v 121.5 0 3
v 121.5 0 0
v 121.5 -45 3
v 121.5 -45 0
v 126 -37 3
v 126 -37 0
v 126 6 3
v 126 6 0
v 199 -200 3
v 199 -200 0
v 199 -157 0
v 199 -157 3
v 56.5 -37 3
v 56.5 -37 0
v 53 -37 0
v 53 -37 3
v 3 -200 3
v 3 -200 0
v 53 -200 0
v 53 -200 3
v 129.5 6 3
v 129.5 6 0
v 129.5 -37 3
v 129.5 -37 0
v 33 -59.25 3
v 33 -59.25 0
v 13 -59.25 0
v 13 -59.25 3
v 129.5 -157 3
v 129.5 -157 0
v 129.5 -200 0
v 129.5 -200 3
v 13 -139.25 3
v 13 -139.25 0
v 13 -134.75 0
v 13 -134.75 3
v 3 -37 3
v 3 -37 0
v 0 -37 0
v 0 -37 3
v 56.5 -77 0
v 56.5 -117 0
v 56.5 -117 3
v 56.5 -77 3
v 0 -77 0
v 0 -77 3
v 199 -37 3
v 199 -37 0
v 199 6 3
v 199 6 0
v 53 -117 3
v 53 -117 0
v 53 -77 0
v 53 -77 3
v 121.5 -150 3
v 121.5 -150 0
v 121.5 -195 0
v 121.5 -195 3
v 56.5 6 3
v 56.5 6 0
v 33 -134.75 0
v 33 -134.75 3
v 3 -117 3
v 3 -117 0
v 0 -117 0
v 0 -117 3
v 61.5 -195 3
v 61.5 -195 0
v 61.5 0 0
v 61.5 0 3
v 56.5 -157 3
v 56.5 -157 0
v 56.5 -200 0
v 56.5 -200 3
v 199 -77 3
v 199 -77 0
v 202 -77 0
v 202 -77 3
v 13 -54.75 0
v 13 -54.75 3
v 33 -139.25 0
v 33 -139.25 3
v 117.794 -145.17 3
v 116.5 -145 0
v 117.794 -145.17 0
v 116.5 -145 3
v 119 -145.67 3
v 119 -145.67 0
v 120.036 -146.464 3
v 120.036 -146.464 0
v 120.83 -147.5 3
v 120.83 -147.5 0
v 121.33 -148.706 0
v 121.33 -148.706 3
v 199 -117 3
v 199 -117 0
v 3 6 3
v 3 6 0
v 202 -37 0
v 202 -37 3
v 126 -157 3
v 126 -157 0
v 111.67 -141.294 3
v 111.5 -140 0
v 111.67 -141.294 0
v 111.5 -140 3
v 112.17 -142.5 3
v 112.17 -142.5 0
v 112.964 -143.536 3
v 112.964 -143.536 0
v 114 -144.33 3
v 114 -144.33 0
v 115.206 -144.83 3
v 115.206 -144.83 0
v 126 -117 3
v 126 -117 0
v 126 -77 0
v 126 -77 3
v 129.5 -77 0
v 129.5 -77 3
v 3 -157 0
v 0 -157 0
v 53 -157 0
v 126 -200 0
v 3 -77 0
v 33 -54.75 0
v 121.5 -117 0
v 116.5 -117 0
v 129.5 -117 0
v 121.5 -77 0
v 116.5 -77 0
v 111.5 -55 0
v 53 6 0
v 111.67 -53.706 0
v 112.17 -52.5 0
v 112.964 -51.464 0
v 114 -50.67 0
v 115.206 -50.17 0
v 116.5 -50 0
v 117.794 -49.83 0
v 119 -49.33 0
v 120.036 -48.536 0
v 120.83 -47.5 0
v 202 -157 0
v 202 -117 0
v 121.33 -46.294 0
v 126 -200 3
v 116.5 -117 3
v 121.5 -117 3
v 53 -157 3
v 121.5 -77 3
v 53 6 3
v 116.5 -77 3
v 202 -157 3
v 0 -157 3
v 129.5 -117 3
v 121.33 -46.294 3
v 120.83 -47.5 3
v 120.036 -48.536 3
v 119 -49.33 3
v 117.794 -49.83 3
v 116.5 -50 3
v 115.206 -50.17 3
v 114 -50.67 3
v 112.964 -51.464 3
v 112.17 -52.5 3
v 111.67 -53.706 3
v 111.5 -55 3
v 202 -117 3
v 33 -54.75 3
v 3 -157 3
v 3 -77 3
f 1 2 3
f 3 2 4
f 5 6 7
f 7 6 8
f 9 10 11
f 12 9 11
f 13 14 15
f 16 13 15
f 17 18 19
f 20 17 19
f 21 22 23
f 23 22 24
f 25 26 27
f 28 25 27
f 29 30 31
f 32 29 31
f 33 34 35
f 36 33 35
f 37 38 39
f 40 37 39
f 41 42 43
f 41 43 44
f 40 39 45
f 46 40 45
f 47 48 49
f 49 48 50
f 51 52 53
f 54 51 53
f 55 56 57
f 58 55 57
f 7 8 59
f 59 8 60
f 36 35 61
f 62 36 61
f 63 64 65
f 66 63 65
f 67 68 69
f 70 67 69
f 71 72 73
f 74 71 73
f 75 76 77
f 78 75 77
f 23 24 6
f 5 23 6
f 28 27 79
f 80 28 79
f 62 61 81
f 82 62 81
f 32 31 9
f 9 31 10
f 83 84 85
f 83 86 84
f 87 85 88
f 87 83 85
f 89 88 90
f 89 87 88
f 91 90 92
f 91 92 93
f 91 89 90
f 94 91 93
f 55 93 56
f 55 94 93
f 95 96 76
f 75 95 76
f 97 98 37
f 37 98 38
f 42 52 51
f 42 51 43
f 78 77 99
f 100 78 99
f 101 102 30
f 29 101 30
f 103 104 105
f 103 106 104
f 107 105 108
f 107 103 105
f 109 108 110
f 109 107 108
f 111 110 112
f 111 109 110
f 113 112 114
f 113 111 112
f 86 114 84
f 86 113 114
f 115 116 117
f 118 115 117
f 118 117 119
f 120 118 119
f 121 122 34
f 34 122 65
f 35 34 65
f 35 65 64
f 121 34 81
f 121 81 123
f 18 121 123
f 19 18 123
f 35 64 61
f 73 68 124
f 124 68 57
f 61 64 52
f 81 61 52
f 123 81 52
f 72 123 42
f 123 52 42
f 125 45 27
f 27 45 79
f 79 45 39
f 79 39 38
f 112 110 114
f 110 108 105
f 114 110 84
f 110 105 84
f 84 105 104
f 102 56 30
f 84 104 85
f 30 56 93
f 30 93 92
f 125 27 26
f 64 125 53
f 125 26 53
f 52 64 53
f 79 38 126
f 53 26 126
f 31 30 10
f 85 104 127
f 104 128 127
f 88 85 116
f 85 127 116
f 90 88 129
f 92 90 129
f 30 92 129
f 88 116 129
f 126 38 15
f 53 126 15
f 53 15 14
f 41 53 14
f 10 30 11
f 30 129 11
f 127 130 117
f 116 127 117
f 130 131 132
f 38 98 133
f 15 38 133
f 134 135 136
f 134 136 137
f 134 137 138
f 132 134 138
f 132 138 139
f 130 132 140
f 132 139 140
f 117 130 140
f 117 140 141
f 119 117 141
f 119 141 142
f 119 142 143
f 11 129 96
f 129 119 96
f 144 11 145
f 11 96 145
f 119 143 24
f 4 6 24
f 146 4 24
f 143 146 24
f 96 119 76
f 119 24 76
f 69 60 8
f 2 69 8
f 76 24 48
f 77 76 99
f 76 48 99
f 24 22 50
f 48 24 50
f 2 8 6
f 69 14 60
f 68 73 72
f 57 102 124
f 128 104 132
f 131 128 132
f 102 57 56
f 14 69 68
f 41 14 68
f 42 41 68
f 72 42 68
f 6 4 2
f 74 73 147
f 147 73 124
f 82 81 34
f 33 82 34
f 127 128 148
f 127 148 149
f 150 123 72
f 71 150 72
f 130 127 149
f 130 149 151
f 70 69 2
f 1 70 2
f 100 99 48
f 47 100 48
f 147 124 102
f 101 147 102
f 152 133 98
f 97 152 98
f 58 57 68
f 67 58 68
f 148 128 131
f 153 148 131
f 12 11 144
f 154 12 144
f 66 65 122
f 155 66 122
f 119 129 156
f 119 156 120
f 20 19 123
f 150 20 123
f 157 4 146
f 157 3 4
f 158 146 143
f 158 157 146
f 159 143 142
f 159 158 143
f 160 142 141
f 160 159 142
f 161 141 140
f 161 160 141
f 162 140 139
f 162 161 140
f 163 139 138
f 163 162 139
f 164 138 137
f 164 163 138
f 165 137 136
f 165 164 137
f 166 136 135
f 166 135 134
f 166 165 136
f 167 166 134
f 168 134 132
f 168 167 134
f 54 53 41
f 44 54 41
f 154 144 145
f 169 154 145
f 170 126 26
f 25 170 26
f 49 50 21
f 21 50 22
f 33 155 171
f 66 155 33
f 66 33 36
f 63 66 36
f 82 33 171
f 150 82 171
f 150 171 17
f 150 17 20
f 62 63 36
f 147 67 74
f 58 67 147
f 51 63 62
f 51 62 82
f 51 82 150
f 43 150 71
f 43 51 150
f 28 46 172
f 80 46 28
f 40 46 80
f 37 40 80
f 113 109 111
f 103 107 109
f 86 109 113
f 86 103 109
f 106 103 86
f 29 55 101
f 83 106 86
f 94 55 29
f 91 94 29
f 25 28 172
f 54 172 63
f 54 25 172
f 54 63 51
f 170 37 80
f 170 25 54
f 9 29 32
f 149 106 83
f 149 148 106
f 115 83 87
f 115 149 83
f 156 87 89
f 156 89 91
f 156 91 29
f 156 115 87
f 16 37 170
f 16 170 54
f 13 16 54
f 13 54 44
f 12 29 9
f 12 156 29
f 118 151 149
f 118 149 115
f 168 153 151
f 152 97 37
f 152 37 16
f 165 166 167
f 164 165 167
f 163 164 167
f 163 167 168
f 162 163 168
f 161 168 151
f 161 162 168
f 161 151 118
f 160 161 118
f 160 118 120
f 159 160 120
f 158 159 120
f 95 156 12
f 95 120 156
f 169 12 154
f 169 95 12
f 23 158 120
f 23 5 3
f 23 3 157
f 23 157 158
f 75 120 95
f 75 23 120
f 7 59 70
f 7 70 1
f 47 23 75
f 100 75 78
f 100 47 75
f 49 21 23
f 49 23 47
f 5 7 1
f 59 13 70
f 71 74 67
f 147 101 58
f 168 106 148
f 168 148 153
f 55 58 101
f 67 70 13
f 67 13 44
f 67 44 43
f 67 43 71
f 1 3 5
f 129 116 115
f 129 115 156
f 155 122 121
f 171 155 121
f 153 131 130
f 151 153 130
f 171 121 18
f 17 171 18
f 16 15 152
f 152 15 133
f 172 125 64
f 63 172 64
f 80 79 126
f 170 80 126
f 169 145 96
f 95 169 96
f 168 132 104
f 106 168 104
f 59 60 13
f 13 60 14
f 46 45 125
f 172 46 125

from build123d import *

# Parameters (mm, degrees)
F0_W     = 3.5
F0_H     = 40
F0_W_2   = 5
F1_DEPTH = 3
F2_R     = 5
F3_R     = 4.99999
F4_R     = 4.99999


# Not quite as in the source:
# - a fillet or chamfer is up to 0.001 mm smaller than in the source, because OpenCascade refuses the exact size


with BuildPart() as f1:
    # F0 (on Top) → F1 (new body)
    with BuildSketch(Plane.XY):
        Polygon((129.5, -200), (199, -200), (199, -157), (202, -157), (202, -117), (199, -117), (199, -77), (202, -77), (202, -37), (199, -37), (199, 6), (129.5, 6), (129.5, -37), (126, -37), (126, 6), (56.5, 6), (56.5, -37), (53, -37), (53, 6), (3, 6), (3, -37), (0, -37), (0, -77), (3, -77), (3, -117), (0, -117), (0, -157), (3, -157), (3, -200), (53, -200), (53, -157), (56.5, -157), (56.5, -200), (126, -200), (126, -157), (129.5, -157), align=None)
        Polygon((33, -134.75), (33, -137), (33, -139.25), (13, -139.25), (13, -134.75), align=None, mode=Mode.SUBTRACT)
        with Locations((54.75, -97)):
            Rectangle(F0_W, F0_H, mode=Mode.SUBTRACT)
        Polygon((61.5, -195), (61.5, -97), (61.5, 0), (121.5, 0), (121.5, -50), (111.5, -50), (111.5, -145), (121.5, -145), (121.5, -195), align=None, mode=Mode.SUBTRACT)
        with Locations((119, -97)):
            Rectangle(F0_W_2, F0_H, mode=Mode.SUBTRACT)
        with Locations((127.75, -97)):
            Rectangle(F0_W, F0_H, mode=Mode.SUBTRACT)
        Polygon((33, -54.75), (33, -57), (33, -59.25), (13, -59.25), (13, -54.75), align=None, mode=Mode.SUBTRACT)
    extrude(amount=F1_DEPTH)

    # F2
    f2_edges = [f1.edges().sort_by_distance(p)[0] for p in [
        (121.5, -50, 1.5),
    ]]
    fillet(f2_edges, radius=F2_R)

    # F3 (radius 5 in the source; OpenCascade refuses exactly that, so slightly less here)
    f3_edges = [f1.edges().sort_by_distance(p)[0] for p in [
        (111.5, -50, 1.5),
    ]]
    fillet(f3_edges, radius=F3_R)

    # F4 (radius 5 in the source; OpenCascade refuses exactly that, so slightly less here)
    f4_edges = [f1.edges().sort_by_distance(p)[0] for p in [
        (121.5, -145, 1.5),
        (111.5, -145, 1.5),
    ]]
    fillet(f4_edges, radius=F4_R)


solid = f1.part
